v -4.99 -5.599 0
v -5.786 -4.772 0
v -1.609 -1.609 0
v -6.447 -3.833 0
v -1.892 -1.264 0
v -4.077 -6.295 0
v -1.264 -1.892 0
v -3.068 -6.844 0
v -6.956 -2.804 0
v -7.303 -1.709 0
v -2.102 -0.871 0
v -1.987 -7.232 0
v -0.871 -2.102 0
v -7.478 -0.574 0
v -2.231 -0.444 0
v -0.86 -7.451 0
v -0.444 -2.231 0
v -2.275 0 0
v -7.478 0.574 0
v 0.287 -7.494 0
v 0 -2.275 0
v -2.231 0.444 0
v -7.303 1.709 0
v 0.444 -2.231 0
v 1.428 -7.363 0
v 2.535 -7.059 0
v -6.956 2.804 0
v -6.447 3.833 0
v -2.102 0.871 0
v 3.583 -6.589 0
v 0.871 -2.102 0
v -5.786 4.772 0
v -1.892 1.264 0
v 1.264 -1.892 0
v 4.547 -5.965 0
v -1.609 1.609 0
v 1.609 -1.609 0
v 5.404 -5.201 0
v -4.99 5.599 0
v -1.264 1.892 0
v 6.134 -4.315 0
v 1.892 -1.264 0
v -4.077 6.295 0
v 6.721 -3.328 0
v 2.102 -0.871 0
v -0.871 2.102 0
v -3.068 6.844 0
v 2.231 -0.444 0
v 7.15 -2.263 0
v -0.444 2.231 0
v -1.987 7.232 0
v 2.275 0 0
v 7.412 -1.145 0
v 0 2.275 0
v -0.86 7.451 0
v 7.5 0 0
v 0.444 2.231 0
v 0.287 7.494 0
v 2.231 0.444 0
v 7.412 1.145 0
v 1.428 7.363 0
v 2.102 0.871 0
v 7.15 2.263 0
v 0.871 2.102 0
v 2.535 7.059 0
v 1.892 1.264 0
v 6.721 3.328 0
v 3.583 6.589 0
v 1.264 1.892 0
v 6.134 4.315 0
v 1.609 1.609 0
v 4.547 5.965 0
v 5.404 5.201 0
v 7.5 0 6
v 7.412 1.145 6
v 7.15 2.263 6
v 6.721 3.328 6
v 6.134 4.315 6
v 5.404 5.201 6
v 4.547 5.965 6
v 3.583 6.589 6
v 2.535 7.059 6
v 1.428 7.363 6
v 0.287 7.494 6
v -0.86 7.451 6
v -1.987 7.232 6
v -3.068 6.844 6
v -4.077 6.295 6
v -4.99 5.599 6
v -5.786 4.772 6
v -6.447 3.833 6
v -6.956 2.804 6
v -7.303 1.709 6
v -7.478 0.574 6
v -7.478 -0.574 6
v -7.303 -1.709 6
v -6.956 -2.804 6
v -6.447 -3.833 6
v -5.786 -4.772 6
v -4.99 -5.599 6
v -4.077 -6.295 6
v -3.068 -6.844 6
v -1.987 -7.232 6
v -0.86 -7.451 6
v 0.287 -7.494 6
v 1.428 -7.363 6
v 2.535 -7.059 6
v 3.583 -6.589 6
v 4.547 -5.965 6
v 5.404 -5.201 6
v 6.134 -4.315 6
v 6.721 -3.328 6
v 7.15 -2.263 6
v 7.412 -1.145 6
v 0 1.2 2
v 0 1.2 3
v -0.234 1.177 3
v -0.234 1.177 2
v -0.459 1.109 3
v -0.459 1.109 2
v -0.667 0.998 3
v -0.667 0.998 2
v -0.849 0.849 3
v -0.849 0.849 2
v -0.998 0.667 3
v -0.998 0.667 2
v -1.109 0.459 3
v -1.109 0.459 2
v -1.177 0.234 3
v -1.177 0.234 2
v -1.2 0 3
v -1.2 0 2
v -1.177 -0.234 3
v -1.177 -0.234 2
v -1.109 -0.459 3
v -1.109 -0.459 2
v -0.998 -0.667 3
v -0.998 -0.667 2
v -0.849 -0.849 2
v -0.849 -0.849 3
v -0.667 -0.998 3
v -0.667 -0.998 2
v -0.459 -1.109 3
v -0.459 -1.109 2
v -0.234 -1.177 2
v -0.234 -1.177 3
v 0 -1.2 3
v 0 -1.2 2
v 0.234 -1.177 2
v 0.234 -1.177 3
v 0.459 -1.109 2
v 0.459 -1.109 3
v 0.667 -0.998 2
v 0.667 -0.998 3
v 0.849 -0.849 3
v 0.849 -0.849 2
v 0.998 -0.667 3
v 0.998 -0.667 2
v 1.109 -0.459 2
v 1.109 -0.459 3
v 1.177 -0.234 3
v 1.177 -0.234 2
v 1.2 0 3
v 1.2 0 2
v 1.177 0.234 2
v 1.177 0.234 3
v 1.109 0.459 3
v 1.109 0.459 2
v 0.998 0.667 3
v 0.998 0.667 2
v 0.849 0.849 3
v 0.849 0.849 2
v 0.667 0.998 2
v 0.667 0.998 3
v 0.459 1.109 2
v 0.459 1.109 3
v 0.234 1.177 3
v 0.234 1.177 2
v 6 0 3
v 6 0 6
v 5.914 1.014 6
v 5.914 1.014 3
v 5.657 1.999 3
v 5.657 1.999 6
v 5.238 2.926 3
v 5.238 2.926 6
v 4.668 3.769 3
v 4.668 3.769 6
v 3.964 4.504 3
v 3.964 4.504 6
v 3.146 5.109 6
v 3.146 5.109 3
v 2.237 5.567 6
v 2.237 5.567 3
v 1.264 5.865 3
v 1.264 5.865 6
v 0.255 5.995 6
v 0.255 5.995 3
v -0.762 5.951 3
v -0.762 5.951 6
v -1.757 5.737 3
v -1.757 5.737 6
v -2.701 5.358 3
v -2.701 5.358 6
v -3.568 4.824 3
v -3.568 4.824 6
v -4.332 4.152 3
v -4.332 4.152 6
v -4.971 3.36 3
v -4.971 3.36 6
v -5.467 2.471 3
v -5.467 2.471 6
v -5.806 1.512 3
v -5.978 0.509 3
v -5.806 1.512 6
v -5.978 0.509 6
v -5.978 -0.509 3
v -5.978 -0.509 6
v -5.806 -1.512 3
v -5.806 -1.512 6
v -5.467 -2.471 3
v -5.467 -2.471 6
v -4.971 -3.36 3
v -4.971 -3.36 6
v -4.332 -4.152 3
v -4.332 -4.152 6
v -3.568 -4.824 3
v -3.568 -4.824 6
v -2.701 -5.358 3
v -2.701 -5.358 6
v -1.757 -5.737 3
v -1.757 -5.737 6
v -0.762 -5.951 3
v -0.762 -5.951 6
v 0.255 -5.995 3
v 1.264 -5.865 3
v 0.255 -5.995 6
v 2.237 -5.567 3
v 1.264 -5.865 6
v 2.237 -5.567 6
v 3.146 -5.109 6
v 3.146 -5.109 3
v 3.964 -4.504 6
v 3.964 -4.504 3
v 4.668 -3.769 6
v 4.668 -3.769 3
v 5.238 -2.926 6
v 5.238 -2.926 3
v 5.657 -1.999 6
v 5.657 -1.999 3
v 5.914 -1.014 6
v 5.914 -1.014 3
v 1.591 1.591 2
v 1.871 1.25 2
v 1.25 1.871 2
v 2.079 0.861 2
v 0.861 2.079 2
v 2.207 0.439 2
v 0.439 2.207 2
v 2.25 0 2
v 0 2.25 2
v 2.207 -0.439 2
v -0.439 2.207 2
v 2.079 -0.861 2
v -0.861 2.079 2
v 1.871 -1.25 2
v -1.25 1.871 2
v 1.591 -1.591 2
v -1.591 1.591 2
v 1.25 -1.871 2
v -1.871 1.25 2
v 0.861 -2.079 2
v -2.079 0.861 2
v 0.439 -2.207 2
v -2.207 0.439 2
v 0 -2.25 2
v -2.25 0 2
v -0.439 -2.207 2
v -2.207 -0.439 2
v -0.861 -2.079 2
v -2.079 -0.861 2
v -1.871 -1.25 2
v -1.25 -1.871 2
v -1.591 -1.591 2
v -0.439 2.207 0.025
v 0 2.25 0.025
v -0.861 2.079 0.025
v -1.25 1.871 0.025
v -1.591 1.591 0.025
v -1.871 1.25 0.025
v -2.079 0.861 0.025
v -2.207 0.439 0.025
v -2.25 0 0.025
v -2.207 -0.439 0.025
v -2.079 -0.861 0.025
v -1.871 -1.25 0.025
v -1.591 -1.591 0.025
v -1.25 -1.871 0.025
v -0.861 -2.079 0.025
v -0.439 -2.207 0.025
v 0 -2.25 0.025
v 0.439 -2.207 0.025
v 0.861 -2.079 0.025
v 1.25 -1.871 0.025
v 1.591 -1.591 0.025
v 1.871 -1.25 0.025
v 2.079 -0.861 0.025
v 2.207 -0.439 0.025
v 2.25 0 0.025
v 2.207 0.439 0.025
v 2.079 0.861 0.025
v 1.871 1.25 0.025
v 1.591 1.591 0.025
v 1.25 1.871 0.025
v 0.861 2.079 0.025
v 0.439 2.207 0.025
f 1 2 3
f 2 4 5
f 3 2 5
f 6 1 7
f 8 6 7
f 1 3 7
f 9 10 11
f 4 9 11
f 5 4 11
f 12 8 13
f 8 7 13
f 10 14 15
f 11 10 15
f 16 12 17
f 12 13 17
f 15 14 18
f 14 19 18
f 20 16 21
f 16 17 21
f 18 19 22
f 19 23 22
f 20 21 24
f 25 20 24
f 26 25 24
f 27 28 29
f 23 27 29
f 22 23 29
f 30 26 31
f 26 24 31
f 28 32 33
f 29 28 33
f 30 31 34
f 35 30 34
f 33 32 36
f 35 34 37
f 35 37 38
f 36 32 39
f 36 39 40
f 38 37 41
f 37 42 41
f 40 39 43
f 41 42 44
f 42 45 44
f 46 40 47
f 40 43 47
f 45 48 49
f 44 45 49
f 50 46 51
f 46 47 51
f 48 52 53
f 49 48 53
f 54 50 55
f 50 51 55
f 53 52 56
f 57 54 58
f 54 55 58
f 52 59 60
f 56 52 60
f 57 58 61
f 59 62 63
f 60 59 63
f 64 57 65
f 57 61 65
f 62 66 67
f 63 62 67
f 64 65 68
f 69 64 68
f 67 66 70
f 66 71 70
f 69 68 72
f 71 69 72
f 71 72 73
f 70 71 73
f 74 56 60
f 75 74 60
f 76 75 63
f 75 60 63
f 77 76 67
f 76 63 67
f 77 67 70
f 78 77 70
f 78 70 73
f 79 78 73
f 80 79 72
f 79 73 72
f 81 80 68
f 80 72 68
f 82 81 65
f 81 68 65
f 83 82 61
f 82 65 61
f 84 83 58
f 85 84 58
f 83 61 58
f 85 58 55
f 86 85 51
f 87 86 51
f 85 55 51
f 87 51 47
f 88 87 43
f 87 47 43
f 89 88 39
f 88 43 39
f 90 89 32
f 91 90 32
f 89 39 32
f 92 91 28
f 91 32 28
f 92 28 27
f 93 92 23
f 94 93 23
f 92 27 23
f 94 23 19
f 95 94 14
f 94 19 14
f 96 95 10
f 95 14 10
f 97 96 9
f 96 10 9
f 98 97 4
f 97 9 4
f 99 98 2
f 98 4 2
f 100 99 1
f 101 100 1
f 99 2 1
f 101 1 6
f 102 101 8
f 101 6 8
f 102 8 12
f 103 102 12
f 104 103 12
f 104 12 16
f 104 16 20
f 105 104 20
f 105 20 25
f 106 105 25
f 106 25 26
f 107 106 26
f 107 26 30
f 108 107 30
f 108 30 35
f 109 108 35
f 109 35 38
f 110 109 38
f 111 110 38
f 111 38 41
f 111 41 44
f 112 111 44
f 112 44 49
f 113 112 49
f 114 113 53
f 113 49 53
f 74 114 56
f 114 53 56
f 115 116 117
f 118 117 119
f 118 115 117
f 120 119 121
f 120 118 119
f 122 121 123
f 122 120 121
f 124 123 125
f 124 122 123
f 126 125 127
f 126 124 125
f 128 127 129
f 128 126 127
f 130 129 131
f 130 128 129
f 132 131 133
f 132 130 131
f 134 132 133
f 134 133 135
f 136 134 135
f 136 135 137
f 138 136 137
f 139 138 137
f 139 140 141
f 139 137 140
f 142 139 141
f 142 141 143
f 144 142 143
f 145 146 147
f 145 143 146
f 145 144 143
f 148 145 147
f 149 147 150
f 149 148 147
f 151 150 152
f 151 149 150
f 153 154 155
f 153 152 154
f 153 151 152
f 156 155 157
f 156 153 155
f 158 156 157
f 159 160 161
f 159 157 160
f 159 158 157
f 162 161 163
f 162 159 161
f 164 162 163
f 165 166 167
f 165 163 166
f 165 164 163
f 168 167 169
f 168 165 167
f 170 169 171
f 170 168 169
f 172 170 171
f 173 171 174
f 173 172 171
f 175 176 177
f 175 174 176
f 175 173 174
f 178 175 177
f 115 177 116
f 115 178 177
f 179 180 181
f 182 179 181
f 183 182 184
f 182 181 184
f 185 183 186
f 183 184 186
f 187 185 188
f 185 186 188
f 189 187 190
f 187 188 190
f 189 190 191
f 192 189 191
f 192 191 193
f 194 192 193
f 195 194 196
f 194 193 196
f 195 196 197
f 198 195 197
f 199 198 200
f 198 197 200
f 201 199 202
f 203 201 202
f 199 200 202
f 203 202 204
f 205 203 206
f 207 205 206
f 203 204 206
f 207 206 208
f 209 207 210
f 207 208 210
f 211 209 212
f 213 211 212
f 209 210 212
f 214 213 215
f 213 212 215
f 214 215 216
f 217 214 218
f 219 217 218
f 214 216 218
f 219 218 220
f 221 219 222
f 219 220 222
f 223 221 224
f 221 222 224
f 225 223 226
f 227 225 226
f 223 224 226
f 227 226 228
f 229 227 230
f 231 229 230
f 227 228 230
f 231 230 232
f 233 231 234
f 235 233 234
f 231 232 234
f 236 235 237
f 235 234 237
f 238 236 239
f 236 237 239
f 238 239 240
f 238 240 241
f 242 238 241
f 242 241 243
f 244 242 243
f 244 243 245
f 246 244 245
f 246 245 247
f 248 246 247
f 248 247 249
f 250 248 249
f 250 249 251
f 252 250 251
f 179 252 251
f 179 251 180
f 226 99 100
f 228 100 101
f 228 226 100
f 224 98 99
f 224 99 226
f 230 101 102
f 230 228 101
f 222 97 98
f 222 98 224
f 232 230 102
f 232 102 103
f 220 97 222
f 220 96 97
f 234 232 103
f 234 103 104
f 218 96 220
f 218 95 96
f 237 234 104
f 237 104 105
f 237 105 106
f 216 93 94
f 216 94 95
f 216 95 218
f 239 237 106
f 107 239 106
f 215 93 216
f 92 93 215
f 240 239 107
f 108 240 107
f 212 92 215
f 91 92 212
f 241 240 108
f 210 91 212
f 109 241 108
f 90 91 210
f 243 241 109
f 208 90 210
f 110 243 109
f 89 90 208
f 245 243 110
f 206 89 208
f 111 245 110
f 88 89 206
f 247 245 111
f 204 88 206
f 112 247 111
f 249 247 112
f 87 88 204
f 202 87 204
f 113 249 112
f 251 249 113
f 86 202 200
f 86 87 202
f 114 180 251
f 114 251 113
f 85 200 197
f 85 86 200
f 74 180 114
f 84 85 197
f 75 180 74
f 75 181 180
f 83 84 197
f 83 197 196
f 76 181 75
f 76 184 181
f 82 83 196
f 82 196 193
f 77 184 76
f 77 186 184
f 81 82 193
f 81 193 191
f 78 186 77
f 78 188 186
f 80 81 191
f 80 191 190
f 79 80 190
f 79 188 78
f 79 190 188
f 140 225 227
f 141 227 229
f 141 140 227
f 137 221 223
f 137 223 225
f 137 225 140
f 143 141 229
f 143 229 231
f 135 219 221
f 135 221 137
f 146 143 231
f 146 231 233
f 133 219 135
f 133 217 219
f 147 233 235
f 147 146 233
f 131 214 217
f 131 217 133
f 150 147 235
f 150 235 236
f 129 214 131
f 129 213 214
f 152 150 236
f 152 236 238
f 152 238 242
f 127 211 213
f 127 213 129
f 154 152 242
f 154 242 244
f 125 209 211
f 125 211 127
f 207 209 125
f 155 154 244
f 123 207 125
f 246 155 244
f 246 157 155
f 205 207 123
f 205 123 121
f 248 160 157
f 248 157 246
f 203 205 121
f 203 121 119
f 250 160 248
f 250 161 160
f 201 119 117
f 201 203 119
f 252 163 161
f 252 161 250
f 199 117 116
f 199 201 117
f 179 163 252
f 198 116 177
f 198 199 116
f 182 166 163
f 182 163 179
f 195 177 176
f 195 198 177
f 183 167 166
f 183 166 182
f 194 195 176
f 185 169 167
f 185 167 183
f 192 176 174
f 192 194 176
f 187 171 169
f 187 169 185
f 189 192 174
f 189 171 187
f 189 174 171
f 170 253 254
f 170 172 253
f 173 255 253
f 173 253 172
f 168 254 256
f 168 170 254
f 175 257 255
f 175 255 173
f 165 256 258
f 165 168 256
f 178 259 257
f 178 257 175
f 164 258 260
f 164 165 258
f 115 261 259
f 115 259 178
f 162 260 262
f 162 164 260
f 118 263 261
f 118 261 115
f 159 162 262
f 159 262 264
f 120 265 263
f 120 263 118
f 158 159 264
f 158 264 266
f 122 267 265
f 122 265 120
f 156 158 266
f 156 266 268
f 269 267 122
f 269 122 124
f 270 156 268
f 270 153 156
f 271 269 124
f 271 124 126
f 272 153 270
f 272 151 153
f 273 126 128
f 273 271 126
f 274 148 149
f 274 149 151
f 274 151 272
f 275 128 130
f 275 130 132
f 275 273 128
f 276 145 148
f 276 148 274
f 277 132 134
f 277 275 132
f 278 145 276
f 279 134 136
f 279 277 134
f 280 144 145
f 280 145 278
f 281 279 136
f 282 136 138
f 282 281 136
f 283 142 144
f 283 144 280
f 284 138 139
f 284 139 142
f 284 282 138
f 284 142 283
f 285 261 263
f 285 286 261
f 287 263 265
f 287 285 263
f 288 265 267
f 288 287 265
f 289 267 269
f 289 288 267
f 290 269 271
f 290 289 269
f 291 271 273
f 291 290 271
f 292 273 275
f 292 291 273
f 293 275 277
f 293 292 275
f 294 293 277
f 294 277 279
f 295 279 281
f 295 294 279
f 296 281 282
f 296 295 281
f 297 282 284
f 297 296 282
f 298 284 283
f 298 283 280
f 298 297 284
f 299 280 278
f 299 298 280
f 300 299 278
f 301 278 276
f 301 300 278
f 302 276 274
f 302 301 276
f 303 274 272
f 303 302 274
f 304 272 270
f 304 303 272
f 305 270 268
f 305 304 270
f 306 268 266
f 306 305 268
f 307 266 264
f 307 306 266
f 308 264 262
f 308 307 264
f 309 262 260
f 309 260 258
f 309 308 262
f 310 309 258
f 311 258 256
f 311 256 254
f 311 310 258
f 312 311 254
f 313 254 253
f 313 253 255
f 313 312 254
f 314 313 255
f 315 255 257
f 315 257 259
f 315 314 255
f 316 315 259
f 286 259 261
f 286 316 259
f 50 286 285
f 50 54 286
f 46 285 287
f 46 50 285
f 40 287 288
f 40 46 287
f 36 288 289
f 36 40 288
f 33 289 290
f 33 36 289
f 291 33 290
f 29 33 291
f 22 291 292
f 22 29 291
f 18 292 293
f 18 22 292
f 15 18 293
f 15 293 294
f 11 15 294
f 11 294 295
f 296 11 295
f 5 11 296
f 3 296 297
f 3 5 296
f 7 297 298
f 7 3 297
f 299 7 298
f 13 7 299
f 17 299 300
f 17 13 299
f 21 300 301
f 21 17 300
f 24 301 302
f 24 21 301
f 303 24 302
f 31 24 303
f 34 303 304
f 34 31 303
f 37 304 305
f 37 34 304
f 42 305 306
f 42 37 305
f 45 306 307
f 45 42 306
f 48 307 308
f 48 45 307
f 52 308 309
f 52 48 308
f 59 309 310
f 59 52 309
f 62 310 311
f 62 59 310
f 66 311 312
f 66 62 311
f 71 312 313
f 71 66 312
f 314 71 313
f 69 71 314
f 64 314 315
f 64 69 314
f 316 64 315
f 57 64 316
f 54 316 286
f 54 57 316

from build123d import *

# Parameters (mm, degrees)
SKETCH_1_R          = 7.5
EXTRUDE_1_DEPTH     = 6
SKETCH_2_R          = 6
CUT_EXTRUDE_1_DEPTH = 3


with BuildPart() as part:
    # 스케치1 → 보스-돌출1 (new body)
    with BuildSketch(Plane.XY):
        Circle(SKETCH_1_R)
    extrude(amount=EXTRUDE_1_DEPTH)

    # 스케치2 → 컷-돌출1 (cut)
    with BuildSketch(Plane.XY.offset(6)):
        Circle(SKETCH_2_R)
    extrude(amount=-CUT_EXTRUDE_1_DEPTH, mode=Mode.SUBTRACT)

    # 스케치8 → M2 소켓 머리 캡 나사용 카운터보어2 (revolve, cut)
    with BuildSketch(Plane.YZ):
        Polygon((0, 0), (0, 5.721032743), (1.2, 5), (1.2, 2), (2.25, 2), (2.25, 0.025), (2.275, 0), align=None)
    revolve(axis=Axis((0, 0, -6.35), (0, 0, 1)), mode=Mode.SUBTRACT)


solid = part.part
